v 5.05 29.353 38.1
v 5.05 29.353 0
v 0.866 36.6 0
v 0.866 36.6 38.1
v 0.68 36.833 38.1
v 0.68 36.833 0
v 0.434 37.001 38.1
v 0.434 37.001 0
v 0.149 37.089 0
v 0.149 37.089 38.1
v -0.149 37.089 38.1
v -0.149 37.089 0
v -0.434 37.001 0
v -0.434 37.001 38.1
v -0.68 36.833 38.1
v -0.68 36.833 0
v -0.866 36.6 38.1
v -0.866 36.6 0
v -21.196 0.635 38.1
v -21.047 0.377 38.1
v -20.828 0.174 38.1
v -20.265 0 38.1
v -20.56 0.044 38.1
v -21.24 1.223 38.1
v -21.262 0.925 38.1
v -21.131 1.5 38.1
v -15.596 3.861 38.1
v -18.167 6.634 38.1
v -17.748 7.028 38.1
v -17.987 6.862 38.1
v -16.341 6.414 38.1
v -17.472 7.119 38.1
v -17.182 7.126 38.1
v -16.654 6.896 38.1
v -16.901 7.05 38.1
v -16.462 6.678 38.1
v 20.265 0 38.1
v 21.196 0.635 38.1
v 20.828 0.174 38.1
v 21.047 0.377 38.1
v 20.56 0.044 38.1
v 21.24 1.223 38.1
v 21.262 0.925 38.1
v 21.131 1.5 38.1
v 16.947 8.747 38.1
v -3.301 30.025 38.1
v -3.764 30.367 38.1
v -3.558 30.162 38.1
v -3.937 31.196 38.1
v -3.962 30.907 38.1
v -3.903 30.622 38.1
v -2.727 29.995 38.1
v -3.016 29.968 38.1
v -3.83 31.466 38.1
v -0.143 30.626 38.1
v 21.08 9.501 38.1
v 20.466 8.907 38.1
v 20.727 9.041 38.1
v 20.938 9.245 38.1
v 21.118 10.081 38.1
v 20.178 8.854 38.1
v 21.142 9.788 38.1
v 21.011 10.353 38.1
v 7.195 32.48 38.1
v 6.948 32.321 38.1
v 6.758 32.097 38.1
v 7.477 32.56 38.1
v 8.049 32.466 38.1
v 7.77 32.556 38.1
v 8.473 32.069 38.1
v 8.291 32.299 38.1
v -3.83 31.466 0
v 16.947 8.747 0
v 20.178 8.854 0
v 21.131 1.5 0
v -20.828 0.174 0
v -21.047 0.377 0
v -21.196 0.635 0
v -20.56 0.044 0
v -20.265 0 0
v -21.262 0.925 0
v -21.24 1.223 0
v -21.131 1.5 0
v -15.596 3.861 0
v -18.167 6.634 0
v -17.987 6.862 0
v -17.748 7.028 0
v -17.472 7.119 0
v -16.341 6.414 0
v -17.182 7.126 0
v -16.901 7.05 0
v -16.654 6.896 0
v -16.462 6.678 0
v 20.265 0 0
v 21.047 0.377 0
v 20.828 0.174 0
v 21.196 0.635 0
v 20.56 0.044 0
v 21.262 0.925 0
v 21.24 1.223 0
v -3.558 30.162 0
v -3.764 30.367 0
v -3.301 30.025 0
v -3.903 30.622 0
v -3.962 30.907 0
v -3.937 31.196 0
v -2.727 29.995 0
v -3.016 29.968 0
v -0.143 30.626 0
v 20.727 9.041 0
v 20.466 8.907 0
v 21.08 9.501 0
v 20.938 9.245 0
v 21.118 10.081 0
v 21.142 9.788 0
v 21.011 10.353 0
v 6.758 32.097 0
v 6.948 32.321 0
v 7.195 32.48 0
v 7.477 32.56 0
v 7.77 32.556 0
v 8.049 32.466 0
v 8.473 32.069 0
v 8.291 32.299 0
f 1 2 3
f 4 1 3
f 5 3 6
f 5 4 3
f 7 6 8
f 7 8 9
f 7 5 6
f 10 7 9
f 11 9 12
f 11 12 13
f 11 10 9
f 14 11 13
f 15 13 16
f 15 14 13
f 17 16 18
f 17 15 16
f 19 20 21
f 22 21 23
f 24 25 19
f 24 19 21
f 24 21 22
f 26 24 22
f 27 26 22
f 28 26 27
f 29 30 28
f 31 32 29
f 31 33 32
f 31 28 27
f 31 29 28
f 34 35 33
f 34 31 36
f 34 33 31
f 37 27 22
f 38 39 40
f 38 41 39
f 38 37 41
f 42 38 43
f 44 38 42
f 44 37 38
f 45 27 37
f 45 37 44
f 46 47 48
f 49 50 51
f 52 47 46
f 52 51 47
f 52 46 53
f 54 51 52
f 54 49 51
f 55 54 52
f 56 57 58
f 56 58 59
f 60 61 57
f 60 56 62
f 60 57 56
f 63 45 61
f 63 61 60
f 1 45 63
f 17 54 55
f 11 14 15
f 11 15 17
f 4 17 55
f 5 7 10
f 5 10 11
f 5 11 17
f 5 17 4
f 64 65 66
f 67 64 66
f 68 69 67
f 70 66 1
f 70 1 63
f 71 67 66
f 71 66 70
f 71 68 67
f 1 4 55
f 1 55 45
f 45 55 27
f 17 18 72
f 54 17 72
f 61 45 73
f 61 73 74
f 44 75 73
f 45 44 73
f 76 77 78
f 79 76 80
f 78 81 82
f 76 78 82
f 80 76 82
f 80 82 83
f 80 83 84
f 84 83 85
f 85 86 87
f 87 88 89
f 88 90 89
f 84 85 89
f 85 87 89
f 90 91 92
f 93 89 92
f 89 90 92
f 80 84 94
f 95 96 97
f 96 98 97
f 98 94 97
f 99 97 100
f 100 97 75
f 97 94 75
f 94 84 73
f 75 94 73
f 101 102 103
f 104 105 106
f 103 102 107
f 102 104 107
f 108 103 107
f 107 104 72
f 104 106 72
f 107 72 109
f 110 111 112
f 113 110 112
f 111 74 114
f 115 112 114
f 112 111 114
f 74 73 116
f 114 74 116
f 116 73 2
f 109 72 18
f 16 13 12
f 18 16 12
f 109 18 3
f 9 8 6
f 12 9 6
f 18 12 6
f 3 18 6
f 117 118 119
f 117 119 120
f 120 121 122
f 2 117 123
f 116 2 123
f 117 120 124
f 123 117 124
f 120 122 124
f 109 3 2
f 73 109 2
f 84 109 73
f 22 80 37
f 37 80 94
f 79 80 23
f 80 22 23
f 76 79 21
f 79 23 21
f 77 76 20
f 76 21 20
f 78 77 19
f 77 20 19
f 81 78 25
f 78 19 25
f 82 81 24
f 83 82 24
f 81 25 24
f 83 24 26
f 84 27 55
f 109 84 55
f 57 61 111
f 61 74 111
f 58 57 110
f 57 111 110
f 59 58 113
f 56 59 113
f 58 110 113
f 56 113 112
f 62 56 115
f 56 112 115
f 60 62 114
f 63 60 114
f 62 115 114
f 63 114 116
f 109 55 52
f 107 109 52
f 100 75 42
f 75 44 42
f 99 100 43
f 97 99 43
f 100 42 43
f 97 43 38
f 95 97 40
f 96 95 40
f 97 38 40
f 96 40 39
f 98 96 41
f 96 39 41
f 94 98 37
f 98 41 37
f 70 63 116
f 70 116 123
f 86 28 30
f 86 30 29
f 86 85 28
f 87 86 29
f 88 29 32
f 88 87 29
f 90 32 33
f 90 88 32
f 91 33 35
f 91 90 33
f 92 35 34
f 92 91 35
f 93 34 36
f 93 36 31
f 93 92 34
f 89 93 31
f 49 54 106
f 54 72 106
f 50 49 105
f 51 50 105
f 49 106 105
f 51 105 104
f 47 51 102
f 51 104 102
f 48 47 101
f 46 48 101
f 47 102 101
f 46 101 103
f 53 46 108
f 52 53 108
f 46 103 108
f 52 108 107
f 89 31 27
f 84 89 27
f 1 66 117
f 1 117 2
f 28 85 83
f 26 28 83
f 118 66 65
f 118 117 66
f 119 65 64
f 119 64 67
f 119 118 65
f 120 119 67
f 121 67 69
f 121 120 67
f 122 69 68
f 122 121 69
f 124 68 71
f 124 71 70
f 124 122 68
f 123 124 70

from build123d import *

# Parameters (mm, degrees)
F1_DEPTH = 38.1
F3_DEPTH = 38.101
F4_R     = 1
F6_DEPTH = 38.1
F7_R     = 1
F8_R     = 1


with BuildPart() as f1:
    # F0 (on Top) → F1 (new body)
    with BuildSketch(Plane.XY):
        Polygon((21.9970452561, 0), (0, 38.1), (-21.9970452561, 0), align=None)
    extrude(amount=F1_DEPTH)

    # F2 (on face) → F3 (cut, through all)
    with BuildSketch(Plane.XY.offset(38.1)):
        Polygon((-0.1427694591, 30.6260475565), (-5, 29.4397459622), (-16.9970452561, 8.6602540378), (-15.595797303, 3.8606182002), align=None)
    extrude(amount=-F3_DEPTH, mode=Mode.SUBTRACT)

    # F4
    f4_edges = [f1.edges().sort_by_distance(p)[0] for p in [
        (-5, 29.439746, 19.05),
        (-16.997045, 8.660254, 19.05),
    ]]
    fillet(f4_edges, radius=F4_R)

    # F5 (on face) → F6 (join, through all)
    with BuildSketch(Plane.XY.offset(38.1)):
        Polygon((7.6392122053, 33.5131891134), (5.05, 29.3531434218), (16.9470452561, 8.7468565782), (21.8443566086, 8.909157278), align=None)
    extrude(amount=-F6_DEPTH)

    # F7
    f7_edges = [f1.edges().sort_by_distance(p)[0] for p in [
        (7.639212, 33.513189, 19.05),
        (21.844357, 8.909157, 19.05),
    ]]
    fillet(f7_edges, radius=F7_R)

    # F8
    f8_edges = [f1.edges().sort_by_distance(p)[0] for p in [
        (0, 38.1, 19.05),
        (-21.997045, 0, 19.05),
        (21.997045, 0, 19.05),
    ]]
    fillet(f8_edges, radius=F8_R)


solid = f1.part
